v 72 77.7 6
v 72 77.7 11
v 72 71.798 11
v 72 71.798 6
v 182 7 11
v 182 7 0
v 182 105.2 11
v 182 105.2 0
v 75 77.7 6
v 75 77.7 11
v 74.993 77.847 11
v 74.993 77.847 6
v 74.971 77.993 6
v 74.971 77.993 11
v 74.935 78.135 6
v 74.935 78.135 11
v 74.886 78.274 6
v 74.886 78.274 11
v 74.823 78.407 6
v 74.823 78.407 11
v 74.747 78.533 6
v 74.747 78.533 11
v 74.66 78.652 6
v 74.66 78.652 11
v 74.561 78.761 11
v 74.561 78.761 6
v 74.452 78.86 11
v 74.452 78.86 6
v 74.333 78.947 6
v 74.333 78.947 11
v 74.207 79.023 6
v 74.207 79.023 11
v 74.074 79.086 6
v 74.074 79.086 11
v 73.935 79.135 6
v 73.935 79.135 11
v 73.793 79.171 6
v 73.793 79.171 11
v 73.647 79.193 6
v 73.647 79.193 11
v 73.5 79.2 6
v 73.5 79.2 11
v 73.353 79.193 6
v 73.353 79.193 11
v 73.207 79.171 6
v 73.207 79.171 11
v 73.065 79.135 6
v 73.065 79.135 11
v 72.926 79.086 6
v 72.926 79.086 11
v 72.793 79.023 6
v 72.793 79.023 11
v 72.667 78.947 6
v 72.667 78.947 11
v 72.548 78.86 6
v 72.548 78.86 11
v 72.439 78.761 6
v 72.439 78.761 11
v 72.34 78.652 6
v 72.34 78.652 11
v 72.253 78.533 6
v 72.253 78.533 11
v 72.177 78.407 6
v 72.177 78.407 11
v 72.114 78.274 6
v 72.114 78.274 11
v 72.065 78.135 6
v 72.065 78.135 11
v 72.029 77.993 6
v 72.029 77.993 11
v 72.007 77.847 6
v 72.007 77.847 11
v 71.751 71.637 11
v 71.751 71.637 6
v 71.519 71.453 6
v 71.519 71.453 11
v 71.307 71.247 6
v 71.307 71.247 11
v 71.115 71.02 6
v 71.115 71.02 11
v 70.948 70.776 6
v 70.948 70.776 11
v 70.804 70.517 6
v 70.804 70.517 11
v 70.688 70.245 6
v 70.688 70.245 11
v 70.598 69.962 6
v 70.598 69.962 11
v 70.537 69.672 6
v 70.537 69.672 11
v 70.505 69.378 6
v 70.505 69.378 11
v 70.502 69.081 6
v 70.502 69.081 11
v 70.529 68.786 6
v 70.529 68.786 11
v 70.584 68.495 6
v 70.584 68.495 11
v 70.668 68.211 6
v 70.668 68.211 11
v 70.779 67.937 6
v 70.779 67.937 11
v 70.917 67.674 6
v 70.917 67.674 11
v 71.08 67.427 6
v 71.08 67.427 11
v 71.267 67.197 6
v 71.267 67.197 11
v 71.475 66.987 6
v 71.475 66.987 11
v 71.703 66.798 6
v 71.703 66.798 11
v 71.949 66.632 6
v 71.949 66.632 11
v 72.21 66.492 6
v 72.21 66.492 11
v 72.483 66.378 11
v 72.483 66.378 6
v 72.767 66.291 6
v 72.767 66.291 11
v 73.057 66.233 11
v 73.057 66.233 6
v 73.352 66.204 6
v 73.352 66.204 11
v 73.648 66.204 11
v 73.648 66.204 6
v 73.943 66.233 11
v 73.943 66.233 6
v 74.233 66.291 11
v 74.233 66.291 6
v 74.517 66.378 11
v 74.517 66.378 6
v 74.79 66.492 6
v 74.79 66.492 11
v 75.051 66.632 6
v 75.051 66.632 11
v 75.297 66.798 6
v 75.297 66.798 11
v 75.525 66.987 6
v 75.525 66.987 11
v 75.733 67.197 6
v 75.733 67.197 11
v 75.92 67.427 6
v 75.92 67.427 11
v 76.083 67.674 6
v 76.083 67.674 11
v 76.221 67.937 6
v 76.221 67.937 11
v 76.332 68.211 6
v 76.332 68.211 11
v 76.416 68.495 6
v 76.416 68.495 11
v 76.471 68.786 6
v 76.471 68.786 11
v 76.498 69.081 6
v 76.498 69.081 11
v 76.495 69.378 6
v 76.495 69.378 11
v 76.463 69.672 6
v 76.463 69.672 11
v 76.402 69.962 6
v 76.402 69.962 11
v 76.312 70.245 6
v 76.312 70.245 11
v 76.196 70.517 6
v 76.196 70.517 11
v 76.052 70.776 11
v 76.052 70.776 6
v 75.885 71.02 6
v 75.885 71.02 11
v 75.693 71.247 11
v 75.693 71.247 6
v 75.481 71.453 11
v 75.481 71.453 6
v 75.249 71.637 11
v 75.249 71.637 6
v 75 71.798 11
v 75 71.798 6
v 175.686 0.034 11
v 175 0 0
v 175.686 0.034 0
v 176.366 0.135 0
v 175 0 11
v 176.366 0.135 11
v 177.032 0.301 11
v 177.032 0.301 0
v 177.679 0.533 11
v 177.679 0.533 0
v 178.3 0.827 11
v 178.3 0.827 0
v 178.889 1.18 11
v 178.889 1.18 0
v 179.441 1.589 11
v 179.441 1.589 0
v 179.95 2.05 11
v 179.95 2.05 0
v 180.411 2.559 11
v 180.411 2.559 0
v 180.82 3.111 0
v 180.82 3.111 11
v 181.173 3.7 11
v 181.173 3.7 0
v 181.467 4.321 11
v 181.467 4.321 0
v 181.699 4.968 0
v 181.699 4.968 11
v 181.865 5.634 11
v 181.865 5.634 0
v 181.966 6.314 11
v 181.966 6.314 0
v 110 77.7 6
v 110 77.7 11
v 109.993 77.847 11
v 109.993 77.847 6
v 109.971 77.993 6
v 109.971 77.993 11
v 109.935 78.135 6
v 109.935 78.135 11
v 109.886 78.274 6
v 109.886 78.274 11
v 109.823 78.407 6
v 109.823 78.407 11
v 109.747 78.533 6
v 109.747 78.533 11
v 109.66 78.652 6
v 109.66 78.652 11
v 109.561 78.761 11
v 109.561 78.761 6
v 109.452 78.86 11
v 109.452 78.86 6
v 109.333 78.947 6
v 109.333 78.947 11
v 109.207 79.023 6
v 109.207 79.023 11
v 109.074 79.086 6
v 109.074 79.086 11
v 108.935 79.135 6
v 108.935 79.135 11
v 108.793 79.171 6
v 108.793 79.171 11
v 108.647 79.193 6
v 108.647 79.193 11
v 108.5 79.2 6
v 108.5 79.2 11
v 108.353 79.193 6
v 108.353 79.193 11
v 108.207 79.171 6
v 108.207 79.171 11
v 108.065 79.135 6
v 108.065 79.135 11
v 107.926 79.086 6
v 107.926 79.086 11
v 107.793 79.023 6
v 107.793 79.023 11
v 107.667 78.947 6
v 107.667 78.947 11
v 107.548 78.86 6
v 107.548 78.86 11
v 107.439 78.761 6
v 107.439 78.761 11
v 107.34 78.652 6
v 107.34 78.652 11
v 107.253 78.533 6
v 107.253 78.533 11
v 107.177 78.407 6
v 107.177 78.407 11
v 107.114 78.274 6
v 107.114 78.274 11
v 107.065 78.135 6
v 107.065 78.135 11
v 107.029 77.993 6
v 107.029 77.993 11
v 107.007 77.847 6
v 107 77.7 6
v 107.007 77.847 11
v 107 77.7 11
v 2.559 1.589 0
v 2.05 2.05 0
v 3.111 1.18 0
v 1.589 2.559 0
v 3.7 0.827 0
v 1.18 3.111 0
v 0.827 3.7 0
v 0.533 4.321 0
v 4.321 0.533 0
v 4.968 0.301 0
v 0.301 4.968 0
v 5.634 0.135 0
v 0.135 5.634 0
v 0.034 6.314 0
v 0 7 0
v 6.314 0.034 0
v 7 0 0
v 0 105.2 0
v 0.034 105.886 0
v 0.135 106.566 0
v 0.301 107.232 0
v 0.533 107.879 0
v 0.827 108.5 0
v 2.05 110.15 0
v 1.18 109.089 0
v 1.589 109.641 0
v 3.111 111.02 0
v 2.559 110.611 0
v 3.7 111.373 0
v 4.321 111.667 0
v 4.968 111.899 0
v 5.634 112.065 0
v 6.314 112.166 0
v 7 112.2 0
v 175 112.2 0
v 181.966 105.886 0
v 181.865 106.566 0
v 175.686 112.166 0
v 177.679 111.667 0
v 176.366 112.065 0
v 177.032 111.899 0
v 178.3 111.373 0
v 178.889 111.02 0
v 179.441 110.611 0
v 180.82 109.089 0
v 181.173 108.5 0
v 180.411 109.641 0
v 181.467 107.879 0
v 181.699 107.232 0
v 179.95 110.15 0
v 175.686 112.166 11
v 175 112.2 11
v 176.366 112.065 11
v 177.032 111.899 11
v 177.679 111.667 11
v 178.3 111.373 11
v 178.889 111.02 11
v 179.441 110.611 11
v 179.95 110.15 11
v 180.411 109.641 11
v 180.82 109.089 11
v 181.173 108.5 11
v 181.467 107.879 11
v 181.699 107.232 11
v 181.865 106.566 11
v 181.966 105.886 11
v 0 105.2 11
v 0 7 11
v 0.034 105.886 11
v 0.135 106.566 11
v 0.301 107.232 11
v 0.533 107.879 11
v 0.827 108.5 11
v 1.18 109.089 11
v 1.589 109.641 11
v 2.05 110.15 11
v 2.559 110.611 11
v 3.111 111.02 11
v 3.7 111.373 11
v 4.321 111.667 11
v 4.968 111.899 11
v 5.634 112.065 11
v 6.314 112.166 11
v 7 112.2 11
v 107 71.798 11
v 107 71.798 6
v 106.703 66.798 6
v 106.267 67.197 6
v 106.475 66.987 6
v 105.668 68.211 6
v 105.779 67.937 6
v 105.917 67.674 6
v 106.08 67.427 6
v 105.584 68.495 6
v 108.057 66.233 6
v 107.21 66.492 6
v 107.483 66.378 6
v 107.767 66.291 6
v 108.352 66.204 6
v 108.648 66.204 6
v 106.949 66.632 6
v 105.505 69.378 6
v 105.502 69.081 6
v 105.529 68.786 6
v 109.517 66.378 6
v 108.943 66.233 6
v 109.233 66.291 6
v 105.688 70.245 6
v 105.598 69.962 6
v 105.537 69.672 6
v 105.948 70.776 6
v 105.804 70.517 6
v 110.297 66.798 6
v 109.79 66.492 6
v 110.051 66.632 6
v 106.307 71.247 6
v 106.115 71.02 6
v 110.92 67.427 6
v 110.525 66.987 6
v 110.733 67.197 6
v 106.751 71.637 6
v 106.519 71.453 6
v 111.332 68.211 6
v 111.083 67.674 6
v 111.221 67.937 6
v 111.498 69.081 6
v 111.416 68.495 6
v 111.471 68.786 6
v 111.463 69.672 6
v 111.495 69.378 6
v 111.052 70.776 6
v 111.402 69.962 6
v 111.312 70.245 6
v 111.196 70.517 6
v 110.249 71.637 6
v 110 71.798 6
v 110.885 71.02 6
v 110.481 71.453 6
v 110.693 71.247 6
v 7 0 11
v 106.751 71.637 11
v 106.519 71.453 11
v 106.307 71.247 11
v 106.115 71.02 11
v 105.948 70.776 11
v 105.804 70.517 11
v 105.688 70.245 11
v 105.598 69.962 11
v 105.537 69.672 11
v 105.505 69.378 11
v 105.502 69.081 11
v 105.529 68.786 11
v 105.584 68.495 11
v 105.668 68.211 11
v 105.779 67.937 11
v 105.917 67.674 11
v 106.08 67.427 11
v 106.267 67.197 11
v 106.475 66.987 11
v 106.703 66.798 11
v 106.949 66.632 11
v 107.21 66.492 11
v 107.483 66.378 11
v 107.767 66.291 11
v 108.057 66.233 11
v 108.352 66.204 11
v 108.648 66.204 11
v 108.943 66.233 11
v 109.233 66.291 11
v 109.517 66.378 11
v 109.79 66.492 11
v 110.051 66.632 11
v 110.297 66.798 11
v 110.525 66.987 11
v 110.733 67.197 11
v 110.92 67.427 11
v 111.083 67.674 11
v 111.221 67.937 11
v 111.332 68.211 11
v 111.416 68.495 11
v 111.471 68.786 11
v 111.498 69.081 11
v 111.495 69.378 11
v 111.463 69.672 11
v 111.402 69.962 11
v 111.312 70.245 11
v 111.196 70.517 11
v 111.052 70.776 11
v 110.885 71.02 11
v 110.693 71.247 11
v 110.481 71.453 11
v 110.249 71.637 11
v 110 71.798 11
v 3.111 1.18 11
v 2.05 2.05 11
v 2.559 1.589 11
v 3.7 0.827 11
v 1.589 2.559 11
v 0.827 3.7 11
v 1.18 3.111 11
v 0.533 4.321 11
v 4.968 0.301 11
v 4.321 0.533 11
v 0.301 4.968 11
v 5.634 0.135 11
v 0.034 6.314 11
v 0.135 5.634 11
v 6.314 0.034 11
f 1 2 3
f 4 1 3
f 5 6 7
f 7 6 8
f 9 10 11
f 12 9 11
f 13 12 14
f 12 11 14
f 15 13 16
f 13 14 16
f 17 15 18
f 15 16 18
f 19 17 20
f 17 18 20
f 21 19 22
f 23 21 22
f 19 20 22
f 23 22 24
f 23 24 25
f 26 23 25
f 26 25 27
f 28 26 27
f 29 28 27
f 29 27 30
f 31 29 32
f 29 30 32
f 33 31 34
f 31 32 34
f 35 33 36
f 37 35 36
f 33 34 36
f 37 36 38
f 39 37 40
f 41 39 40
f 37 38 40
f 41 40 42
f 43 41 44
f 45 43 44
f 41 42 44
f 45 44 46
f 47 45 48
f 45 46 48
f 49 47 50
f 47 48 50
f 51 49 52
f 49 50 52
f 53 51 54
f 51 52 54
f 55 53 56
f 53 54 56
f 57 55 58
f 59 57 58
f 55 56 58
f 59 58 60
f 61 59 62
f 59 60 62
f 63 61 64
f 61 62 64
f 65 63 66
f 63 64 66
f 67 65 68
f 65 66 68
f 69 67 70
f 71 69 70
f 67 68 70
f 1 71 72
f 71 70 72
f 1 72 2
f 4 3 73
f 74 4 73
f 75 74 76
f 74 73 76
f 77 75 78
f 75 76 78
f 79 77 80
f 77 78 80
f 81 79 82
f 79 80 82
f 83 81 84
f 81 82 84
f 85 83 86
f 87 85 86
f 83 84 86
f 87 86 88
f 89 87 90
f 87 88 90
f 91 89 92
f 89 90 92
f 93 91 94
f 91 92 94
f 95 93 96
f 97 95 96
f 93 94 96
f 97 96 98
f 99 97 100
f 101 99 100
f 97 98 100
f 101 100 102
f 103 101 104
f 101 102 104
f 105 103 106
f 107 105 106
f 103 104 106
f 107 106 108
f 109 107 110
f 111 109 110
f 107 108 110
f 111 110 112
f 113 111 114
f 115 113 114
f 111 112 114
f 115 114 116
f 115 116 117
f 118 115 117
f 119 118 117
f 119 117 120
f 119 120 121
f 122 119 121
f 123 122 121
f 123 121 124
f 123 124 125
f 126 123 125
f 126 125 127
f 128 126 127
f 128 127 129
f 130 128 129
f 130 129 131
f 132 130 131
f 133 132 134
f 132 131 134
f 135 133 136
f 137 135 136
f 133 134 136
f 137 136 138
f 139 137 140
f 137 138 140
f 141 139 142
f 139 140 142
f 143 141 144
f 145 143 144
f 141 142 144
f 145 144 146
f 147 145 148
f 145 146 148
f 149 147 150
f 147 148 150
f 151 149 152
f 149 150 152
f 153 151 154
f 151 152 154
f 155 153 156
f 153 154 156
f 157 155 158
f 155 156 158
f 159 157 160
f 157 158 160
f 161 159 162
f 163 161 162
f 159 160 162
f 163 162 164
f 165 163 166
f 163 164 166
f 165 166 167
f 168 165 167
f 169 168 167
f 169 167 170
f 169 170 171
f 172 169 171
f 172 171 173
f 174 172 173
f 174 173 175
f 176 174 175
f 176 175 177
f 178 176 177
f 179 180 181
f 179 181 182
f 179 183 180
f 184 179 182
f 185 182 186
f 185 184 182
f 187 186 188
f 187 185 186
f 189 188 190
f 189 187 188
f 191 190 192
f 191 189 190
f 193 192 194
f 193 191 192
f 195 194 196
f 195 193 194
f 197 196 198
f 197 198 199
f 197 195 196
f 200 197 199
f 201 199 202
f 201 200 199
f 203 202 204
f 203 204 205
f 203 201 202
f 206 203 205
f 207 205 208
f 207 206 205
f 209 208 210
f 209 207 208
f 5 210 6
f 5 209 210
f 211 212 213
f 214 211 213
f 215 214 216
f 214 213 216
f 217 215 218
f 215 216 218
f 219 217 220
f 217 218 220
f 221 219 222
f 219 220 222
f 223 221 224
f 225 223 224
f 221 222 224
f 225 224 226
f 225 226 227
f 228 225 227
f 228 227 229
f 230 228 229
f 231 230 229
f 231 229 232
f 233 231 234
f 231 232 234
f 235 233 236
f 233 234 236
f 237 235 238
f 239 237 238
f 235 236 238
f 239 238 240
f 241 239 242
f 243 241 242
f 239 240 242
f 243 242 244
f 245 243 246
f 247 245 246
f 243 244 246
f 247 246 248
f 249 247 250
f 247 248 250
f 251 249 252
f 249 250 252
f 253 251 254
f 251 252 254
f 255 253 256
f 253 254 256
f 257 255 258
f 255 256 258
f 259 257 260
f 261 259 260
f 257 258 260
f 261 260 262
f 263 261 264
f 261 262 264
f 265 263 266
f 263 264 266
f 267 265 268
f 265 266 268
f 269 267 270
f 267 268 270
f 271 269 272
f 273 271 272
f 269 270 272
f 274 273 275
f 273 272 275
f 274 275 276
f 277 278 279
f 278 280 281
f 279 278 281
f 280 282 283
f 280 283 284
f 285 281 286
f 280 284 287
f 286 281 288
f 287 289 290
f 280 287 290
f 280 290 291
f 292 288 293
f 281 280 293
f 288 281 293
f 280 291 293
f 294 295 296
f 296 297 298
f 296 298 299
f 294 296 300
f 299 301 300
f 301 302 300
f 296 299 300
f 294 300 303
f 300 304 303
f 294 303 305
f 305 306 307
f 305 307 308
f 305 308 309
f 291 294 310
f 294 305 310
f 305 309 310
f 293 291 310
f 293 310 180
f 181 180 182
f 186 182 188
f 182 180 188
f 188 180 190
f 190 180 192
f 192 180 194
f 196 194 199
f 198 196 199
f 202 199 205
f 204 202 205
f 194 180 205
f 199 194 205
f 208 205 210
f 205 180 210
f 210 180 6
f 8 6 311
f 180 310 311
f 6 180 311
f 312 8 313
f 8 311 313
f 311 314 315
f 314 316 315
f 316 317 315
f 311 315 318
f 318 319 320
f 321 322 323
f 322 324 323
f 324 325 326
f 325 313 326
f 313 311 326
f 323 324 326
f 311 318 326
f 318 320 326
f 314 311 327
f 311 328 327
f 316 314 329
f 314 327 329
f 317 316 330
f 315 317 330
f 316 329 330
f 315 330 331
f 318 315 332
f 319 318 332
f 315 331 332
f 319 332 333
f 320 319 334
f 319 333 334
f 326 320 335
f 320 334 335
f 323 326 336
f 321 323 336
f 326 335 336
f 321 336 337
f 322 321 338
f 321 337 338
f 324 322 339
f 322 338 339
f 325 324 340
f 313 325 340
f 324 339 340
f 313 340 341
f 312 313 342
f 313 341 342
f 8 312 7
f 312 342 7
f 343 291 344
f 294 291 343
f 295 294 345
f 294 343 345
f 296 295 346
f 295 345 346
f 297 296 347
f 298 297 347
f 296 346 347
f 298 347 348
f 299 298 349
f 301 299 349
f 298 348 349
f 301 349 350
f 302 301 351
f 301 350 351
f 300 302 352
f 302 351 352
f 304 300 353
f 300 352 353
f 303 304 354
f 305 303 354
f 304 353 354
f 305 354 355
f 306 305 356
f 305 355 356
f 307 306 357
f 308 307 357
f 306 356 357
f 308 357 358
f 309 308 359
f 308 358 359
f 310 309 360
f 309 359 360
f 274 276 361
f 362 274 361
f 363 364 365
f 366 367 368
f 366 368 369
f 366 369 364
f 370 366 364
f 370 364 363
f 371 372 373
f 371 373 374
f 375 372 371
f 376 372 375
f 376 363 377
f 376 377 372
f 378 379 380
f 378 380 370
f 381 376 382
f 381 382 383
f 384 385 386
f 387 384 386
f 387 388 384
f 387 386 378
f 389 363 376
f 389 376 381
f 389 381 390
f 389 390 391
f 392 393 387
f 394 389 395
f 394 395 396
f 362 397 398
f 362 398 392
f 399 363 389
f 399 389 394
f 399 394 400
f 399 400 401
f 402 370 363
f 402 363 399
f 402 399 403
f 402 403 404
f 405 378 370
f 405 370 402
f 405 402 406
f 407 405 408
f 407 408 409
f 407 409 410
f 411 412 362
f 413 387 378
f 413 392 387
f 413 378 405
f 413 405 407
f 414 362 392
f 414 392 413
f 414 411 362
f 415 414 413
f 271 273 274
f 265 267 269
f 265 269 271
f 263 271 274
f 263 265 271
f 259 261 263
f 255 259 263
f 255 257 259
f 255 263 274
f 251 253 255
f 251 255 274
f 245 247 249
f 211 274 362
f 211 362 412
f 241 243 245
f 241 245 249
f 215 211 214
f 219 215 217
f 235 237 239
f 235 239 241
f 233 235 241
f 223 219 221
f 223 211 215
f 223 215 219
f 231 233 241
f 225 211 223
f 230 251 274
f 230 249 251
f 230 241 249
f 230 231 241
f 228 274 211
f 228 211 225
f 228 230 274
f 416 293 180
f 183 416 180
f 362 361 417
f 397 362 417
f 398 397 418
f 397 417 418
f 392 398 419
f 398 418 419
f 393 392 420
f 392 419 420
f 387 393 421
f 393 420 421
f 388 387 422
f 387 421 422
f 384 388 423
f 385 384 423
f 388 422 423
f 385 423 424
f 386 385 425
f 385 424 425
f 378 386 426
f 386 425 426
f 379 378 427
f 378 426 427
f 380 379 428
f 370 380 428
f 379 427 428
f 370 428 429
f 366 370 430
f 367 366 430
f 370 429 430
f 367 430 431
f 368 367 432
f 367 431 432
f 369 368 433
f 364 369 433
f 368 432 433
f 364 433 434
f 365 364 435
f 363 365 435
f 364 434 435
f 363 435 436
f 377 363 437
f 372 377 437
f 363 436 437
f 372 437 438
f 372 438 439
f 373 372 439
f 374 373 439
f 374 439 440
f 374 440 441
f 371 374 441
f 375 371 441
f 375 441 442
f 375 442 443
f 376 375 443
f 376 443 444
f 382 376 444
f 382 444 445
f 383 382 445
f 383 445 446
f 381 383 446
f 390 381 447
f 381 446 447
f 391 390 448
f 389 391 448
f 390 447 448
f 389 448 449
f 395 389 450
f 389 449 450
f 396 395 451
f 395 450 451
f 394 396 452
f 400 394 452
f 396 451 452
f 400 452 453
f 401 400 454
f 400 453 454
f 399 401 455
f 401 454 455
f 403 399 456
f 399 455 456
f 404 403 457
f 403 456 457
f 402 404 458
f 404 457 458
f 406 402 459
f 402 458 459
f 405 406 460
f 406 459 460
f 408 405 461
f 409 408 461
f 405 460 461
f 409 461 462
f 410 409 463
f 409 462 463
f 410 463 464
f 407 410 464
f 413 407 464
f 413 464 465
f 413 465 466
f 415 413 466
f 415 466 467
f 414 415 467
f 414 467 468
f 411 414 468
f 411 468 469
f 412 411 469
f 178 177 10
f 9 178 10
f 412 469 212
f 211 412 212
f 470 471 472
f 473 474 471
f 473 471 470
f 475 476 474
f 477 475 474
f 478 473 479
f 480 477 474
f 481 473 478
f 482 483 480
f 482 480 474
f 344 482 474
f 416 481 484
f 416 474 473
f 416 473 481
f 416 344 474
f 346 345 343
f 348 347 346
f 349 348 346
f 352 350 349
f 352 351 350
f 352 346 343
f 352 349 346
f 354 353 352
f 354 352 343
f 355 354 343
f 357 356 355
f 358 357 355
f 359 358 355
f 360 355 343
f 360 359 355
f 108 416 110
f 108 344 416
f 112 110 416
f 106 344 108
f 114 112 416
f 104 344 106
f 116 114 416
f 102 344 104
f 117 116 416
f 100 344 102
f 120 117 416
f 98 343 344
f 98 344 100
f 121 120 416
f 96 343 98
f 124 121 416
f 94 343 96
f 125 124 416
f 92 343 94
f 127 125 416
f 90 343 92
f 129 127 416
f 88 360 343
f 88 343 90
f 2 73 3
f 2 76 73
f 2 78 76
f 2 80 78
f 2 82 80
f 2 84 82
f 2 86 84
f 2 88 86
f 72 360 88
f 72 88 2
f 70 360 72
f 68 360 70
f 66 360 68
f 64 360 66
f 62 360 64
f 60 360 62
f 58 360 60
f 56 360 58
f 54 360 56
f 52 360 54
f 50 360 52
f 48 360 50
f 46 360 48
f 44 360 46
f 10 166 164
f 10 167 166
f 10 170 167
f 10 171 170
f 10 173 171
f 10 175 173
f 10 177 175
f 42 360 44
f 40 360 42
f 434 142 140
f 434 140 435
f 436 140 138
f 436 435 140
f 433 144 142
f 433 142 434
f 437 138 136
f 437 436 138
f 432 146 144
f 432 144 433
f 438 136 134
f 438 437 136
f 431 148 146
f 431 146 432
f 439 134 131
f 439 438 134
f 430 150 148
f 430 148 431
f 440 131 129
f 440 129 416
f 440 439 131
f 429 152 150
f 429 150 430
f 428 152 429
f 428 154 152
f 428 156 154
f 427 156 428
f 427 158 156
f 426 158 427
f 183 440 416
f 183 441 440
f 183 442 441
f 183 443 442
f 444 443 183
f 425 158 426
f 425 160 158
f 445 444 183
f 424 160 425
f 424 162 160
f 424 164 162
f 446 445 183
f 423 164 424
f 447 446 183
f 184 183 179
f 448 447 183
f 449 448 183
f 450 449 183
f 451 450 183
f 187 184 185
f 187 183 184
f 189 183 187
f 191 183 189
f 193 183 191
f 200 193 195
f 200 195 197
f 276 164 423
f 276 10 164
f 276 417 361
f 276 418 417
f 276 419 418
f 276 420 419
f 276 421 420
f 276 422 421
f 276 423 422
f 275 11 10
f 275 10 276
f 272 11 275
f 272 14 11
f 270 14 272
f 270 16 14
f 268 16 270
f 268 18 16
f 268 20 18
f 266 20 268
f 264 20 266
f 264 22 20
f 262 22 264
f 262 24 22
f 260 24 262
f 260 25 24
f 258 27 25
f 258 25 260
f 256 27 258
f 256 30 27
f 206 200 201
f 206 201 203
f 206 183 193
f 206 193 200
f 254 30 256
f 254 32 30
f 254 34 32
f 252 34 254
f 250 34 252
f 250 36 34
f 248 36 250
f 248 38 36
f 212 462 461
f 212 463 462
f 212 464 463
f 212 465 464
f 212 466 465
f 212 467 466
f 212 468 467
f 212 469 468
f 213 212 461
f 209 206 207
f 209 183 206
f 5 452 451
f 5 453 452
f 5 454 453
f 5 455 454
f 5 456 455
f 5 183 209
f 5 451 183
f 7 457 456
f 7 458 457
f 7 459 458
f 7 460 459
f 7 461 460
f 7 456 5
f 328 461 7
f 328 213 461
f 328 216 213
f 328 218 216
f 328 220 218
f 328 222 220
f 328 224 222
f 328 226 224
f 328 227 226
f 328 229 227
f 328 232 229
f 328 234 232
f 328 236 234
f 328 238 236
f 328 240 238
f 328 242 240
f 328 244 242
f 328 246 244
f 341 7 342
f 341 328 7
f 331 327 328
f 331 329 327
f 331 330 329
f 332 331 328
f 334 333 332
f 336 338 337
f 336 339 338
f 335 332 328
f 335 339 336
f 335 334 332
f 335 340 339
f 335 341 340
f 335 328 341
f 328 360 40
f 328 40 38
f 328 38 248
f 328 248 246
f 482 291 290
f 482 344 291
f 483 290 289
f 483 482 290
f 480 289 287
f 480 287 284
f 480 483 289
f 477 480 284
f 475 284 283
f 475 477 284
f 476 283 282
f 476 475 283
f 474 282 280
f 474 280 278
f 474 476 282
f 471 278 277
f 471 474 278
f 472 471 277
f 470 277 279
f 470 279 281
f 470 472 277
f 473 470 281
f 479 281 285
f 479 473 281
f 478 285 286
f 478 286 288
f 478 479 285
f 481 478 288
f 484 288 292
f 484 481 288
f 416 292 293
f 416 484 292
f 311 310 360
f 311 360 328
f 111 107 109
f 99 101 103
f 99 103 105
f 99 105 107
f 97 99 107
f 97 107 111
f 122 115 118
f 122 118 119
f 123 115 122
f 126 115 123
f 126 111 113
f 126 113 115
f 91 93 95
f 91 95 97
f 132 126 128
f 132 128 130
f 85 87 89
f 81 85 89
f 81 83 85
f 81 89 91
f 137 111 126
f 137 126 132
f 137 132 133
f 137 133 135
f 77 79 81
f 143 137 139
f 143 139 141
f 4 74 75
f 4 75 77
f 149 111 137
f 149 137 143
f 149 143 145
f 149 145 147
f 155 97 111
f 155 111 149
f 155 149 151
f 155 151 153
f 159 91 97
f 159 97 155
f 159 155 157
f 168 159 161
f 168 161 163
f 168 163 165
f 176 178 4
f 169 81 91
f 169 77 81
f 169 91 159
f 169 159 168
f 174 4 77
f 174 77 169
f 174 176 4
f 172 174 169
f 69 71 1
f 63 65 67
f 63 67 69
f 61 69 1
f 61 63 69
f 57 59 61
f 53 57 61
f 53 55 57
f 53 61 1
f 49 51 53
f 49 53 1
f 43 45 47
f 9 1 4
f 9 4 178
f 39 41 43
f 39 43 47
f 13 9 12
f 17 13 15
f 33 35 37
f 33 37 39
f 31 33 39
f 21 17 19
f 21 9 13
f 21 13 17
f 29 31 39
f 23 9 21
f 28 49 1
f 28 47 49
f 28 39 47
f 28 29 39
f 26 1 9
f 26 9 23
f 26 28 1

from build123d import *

# Parameters (mm, degrees)
SKETCH_W     = 182
SKETCH_H     = 112.2
PAD_DEPTH    = 11
POCKET_DEPTH = 5
FILLET_R     = 7


with BuildPart() as part:
    # Sketch → Pad (new body)
    with BuildSketch(Plane.XY):
        with Locations((91, 56.1)):
            Rectangle(SKETCH_W, SKETCH_H)
    extrude(amount=PAD_DEPTH)

    # Sketch001 (on Face6 of Pad) → Pocket (cut)
    with BuildSketch(Plane.XY.offset(11)):
        with BuildLine():
            ThreePointArc((75, 77.7), (73.5, 79.2), (72, 77.7))
            Line((72, 77.7), (72, 71.798076))
            ThreePointArc((72, 71.798076), (73.5, 66.2), (75, 71.798076))
            Line((75, 71.798076), (75, 77.7))
        make_face()
        with BuildLine():
            ThreePointArc((110, 77.7), (108.5, 79.2), (107, 77.7))
            Line((107, 77.7), (107, 71.798076))
            ThreePointArc((107, 71.798076), (108.5, 66.2), (110, 71.798076))
            Line((110, 71.798076), (110, 77.7))
        make_face()
    extrude(amount=-POCKET_DEPTH, mode=Mode.SUBTRACT)

    # Fillet
    fillet_edges = [part.edges().sort_by_distance(p)[0] for p in [
        (0, 0, 5.5),
        (182, 0, 5.5),
        (182, 112.2, 5.5),
        (0, 112.2, 5.5),
    ]]
    fillet(fillet_edges, radius=FILLET_R)


solid = part.part
